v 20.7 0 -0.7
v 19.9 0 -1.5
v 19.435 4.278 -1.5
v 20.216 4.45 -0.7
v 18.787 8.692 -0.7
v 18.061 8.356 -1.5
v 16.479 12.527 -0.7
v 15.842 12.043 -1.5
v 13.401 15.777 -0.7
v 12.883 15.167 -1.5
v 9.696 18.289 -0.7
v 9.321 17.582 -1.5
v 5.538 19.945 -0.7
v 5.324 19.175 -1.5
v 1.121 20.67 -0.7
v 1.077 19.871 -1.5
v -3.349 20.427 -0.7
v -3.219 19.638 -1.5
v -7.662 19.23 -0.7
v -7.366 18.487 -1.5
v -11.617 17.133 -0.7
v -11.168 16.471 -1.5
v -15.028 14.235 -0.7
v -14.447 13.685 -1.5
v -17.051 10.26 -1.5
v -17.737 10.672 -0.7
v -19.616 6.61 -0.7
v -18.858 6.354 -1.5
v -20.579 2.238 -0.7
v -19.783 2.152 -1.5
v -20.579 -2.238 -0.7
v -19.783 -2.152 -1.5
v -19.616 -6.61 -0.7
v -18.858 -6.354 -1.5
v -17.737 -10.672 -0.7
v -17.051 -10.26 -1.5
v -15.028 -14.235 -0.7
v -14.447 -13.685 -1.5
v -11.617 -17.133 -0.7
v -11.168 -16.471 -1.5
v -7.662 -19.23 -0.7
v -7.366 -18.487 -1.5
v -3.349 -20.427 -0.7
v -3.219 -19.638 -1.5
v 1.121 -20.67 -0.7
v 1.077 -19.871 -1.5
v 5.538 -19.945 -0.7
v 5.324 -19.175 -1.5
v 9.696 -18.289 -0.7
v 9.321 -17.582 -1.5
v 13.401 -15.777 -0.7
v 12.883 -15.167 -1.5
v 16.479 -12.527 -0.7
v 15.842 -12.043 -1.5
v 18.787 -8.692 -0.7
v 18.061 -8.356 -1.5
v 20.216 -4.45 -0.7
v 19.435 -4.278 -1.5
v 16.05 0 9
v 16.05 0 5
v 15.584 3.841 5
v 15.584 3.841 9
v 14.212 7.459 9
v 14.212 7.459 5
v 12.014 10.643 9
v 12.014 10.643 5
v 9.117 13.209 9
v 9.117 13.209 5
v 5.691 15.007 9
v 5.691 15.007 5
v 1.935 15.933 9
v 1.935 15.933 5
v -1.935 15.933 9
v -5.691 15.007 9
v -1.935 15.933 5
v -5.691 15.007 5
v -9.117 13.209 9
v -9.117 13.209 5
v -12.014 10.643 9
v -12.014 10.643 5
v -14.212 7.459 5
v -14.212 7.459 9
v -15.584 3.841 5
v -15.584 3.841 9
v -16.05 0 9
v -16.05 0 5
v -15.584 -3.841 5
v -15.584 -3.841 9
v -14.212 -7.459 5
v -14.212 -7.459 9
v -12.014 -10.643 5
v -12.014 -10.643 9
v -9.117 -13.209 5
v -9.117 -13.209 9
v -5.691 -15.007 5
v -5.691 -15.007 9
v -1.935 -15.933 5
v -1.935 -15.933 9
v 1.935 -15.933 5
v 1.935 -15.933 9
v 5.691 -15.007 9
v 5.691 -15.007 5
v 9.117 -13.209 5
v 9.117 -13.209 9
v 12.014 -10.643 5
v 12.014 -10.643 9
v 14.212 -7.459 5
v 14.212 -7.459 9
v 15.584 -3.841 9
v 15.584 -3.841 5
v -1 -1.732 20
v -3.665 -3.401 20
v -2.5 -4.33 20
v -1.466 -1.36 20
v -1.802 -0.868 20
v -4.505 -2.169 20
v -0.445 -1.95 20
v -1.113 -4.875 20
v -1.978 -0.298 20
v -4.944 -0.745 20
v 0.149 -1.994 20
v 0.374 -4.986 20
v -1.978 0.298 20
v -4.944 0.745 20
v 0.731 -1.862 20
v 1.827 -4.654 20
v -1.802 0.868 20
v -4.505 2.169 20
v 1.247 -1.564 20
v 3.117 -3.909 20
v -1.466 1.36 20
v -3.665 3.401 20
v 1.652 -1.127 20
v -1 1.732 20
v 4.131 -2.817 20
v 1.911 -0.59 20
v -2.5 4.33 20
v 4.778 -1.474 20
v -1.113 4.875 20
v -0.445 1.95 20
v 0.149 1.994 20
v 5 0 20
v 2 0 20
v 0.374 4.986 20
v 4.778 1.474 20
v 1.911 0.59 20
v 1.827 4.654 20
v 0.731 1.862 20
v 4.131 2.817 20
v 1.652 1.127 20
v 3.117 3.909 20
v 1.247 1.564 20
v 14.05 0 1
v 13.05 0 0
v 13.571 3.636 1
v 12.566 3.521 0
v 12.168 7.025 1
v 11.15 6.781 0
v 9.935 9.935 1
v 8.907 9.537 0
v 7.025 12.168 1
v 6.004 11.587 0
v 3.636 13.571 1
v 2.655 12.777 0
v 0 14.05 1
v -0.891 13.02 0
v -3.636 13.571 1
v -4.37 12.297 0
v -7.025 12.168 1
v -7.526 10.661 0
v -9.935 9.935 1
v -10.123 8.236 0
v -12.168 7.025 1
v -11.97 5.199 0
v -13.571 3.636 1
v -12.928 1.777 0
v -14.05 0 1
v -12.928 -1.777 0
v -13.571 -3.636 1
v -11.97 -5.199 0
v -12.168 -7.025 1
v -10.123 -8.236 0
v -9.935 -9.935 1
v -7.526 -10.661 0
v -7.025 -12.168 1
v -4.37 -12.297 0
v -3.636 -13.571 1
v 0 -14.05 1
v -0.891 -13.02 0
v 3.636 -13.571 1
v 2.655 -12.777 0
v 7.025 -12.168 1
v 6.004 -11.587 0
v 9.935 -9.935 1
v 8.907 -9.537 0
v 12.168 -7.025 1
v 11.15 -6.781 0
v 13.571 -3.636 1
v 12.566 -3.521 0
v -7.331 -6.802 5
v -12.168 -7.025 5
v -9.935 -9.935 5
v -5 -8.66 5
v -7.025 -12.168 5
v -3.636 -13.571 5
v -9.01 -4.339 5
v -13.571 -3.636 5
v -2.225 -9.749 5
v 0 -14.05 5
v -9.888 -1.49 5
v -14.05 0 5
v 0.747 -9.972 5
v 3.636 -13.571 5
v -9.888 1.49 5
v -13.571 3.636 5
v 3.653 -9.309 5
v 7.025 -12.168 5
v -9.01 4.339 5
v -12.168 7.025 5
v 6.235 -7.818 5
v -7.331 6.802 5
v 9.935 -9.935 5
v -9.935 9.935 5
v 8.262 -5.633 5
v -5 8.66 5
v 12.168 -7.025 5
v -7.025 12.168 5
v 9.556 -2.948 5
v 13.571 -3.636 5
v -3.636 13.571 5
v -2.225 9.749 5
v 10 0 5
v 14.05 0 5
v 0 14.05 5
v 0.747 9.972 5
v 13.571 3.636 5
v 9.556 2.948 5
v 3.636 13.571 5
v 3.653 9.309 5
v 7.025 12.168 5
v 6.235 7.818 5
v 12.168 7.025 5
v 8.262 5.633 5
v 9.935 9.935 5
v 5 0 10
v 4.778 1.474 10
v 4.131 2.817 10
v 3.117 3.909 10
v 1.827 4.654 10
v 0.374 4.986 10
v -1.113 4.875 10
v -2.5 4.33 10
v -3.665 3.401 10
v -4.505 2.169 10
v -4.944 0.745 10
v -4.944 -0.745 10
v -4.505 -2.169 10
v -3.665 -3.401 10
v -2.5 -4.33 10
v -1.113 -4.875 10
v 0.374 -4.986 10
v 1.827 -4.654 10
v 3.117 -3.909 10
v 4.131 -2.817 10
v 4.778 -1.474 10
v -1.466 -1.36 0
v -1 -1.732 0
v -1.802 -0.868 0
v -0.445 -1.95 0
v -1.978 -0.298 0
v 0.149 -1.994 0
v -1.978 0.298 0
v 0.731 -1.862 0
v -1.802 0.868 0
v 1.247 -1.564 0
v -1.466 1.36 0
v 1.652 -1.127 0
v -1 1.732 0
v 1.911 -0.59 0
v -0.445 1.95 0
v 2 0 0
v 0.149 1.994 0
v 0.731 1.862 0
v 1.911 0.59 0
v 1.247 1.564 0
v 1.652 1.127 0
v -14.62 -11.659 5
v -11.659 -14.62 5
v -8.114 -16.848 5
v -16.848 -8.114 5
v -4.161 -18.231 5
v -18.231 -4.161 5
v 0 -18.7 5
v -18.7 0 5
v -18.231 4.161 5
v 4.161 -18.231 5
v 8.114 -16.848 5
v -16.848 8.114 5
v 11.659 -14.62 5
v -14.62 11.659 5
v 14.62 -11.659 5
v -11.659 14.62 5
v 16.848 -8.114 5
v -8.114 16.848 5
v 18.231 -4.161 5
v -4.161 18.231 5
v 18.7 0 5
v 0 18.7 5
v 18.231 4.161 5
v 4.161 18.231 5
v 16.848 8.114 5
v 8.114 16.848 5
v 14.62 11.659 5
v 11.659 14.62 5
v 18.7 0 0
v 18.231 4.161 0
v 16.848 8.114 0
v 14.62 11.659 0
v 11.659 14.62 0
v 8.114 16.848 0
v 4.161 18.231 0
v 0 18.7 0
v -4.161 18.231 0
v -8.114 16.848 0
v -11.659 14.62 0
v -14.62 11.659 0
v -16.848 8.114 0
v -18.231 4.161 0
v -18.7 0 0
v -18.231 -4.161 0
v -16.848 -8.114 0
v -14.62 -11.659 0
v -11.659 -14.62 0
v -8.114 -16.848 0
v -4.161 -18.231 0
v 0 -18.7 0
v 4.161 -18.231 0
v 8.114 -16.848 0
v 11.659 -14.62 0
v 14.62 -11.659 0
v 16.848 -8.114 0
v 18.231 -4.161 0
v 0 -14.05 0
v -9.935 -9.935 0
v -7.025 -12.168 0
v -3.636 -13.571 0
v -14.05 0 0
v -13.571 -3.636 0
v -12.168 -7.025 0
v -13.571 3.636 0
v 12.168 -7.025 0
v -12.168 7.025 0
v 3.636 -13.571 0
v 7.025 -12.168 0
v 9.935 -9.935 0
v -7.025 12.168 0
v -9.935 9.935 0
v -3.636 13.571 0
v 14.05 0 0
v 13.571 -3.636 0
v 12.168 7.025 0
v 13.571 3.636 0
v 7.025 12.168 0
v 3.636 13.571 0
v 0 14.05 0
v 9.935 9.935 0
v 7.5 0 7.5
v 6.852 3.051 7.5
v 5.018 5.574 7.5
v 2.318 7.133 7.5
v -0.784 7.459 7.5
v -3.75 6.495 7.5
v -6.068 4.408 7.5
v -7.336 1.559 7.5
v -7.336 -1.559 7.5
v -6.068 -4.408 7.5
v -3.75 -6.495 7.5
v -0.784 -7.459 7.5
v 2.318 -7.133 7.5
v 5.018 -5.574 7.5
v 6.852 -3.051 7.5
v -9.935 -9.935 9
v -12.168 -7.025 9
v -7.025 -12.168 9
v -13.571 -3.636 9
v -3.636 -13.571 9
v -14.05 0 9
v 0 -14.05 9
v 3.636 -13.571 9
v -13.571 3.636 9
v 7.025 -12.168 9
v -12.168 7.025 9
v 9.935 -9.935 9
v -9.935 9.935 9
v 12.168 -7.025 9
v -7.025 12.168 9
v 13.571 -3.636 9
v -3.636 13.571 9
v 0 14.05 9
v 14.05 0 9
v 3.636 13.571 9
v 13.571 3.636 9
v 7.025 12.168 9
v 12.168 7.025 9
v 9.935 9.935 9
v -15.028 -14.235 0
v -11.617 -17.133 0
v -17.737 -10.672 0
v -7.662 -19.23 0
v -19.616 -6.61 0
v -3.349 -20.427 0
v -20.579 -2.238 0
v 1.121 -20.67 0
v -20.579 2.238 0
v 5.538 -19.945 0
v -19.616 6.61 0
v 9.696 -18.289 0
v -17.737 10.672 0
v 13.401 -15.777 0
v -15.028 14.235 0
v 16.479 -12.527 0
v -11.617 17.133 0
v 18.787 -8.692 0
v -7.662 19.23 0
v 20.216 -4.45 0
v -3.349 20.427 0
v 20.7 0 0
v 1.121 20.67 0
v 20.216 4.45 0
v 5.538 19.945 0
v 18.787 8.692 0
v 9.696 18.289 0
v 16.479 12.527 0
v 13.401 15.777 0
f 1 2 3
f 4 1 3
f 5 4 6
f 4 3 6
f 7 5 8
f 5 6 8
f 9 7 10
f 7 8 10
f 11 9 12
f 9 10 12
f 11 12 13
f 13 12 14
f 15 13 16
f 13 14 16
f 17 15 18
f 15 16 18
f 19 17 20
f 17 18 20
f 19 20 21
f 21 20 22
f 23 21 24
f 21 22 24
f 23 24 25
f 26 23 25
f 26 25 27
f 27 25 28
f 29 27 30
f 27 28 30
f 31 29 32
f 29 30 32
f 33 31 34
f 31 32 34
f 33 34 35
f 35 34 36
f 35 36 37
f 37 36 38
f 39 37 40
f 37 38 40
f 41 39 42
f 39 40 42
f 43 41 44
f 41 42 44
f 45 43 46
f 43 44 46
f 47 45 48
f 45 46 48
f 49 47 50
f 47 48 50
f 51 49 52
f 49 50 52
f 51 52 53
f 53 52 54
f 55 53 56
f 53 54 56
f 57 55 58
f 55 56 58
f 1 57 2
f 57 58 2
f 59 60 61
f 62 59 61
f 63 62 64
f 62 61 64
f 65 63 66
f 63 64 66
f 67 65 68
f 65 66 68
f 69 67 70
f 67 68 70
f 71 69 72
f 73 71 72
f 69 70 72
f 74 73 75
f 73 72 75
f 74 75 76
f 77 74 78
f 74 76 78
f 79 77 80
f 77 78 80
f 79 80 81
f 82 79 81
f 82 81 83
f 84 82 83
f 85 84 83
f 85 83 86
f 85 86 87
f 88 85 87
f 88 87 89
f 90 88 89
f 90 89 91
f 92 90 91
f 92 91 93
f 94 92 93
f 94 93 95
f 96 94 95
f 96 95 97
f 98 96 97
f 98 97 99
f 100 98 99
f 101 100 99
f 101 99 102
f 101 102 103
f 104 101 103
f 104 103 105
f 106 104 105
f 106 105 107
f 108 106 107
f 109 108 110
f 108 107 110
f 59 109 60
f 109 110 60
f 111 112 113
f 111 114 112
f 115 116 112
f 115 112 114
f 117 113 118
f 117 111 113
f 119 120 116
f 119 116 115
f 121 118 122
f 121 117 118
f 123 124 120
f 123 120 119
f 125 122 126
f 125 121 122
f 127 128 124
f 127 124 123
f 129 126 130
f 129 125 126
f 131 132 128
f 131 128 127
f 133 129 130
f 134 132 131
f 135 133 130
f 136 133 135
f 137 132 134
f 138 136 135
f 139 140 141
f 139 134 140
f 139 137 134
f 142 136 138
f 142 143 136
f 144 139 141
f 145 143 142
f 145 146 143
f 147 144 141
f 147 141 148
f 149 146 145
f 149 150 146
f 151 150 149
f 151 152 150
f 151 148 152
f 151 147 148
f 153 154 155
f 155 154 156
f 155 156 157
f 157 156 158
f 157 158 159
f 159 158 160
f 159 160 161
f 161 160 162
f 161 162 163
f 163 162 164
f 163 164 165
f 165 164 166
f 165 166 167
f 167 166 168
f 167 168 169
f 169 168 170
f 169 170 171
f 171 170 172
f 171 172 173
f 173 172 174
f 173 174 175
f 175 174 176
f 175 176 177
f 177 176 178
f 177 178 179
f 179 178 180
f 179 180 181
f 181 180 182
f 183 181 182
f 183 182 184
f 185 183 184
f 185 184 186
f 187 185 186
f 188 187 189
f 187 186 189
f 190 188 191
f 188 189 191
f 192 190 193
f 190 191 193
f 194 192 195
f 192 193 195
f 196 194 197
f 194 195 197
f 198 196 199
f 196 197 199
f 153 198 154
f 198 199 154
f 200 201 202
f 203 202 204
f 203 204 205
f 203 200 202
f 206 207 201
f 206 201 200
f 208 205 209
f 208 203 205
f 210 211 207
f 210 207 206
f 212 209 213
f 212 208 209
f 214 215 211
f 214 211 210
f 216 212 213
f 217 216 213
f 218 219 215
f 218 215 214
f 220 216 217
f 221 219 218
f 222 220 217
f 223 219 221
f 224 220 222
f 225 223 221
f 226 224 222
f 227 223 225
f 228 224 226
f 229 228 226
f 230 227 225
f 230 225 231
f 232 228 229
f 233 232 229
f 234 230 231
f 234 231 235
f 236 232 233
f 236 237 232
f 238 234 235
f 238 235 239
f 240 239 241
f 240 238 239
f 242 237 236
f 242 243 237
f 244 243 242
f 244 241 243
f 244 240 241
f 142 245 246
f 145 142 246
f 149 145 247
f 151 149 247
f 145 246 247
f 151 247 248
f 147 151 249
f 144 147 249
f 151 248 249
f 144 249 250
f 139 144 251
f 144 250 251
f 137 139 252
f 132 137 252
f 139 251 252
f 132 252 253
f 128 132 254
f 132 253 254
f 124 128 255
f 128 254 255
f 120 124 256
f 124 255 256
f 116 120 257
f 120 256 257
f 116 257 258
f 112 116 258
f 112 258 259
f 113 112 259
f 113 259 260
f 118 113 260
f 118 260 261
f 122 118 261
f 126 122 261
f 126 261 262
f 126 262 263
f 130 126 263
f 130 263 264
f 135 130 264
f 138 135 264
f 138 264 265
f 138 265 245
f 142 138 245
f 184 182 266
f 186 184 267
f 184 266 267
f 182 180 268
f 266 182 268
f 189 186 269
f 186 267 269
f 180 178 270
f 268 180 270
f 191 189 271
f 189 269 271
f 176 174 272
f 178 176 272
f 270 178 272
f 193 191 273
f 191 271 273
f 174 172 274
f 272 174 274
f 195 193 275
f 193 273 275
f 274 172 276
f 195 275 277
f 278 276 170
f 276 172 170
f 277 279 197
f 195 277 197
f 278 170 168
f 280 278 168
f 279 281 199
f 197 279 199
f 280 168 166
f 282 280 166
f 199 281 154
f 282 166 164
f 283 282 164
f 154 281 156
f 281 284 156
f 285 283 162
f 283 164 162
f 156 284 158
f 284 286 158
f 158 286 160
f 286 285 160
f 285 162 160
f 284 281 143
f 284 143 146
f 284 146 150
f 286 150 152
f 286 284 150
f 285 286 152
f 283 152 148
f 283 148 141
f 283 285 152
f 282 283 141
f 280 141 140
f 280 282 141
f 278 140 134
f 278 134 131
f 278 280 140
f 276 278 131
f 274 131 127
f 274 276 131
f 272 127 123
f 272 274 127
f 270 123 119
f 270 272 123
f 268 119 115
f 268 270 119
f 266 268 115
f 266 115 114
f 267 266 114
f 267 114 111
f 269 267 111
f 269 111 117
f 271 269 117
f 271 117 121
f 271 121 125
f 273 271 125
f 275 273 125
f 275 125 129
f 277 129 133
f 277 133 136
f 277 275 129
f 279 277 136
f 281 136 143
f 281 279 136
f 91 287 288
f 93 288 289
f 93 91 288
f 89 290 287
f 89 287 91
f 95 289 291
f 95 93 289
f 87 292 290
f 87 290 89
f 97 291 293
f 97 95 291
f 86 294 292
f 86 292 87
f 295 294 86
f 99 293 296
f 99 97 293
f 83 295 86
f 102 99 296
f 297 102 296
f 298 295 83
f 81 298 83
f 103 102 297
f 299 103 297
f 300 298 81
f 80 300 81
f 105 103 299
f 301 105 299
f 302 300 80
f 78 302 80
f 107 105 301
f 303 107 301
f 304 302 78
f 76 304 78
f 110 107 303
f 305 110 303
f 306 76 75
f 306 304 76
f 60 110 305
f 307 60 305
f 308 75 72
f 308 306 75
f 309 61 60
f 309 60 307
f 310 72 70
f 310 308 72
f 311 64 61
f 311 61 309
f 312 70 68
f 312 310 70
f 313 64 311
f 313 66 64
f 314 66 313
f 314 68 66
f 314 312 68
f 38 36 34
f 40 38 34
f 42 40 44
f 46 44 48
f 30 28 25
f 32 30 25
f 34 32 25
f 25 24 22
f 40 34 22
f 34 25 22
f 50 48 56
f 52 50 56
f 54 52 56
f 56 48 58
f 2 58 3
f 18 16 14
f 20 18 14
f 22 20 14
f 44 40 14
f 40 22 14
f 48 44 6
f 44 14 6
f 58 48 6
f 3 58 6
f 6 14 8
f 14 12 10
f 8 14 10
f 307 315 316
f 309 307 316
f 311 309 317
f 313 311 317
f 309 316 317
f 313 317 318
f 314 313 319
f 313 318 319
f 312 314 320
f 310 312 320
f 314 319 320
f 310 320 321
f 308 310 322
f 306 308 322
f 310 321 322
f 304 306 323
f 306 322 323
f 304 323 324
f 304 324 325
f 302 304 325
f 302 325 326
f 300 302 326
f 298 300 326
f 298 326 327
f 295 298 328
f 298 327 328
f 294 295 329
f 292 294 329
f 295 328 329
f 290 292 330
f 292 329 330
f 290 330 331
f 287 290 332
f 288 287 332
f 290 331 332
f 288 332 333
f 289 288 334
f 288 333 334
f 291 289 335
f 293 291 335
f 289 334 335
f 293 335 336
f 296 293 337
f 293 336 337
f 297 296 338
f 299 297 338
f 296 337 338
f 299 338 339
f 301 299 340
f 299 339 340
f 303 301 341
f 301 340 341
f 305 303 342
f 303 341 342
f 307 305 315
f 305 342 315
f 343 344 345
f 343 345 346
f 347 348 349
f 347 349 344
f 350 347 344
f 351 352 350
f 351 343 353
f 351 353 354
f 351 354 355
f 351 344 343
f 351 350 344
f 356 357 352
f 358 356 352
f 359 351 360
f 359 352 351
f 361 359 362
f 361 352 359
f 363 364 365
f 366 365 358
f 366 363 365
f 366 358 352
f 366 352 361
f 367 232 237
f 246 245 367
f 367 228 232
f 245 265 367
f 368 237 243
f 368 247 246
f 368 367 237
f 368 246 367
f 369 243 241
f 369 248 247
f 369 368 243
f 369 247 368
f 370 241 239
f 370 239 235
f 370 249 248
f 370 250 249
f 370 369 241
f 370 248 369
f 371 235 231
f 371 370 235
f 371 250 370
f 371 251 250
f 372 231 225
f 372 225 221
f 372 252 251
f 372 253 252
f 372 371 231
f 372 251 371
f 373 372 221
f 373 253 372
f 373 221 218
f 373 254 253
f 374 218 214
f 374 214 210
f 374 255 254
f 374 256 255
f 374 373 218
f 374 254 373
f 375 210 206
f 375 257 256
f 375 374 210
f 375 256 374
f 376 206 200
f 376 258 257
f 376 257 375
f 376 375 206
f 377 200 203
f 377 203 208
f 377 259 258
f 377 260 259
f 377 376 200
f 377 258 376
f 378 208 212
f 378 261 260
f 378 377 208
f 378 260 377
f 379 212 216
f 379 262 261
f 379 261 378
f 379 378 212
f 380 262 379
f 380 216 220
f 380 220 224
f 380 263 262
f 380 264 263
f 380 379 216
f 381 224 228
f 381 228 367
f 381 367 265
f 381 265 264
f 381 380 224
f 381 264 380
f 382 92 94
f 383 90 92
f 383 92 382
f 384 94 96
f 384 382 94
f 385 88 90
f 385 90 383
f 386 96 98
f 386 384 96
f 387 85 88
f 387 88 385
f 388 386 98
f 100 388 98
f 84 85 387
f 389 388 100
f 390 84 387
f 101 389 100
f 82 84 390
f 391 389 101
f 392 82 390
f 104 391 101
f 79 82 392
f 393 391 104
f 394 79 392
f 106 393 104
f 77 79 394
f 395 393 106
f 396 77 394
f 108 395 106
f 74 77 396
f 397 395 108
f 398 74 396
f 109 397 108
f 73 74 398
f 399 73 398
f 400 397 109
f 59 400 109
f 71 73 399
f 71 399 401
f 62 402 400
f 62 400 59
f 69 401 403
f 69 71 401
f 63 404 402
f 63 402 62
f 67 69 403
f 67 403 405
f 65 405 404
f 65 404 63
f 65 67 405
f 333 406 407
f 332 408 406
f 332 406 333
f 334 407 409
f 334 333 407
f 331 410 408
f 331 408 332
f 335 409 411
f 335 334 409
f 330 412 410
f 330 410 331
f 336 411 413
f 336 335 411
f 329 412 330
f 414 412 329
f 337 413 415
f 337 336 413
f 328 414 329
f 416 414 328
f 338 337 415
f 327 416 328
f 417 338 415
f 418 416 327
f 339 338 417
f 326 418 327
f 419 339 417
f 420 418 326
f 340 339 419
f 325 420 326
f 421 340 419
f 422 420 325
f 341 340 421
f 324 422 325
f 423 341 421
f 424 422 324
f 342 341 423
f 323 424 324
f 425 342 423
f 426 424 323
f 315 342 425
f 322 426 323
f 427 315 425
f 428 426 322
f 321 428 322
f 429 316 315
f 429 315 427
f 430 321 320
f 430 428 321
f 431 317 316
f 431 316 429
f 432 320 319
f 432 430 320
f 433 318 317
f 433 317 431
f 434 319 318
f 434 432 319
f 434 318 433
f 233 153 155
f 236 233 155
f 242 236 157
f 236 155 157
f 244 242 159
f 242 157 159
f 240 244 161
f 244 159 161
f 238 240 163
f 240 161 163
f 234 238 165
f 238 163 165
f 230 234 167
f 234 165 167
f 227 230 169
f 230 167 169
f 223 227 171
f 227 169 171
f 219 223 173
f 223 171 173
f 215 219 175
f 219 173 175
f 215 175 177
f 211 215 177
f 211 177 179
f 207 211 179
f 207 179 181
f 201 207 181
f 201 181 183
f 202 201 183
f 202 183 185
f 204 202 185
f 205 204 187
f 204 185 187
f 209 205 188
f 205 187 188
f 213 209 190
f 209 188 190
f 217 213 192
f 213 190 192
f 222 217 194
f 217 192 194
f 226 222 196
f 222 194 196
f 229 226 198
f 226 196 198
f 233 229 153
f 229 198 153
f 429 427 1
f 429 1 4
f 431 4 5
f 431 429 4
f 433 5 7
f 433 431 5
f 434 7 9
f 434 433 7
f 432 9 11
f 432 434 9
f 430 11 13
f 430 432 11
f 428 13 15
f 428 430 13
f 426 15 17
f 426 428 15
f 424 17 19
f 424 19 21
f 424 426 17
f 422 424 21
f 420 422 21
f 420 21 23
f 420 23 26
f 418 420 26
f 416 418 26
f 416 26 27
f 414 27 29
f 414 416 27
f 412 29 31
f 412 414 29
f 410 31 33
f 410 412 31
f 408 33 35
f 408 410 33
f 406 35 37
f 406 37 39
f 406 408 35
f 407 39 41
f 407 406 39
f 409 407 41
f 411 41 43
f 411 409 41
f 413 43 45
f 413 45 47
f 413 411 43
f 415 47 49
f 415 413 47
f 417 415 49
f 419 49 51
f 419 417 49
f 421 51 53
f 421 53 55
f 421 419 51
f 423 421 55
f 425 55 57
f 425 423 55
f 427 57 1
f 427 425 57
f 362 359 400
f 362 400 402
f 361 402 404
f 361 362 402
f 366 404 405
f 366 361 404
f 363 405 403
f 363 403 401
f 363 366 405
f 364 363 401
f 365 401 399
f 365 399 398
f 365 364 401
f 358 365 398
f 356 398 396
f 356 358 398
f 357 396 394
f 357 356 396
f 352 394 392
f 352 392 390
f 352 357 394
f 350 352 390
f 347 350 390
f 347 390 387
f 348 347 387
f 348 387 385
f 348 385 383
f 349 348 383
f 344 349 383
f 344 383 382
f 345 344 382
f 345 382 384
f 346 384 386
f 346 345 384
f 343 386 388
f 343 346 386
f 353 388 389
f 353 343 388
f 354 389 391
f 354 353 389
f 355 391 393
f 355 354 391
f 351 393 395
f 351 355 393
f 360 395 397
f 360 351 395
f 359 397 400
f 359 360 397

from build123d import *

# Parameters (mm, degrees)
F0_R     = 20.7
F0_R_2   = 18.7
F0_R_3   = 16.05
F0_R_4   = 14.05
F0_R_5   = 5
F0_R_6   = 2
F1_DEPTH = 1.5
F2_DEPTH = 9
F3_DEPTH = 5
F4_SIZE  = 0.8
F5_DEPTH = 20
F6_DEPTH = 5
F7_SIZE  = 1
F8_SIZE  = 5


with BuildPart() as f1:
    # F0 (on Top) → F1 (new body)
    with BuildSketch(Plane.XY):
        Circle(F0_R)
        Circle(F0_R_2, mode=Mode.SUBTRACT)
        Circle(F0_R_2)
        Circle(F0_R_3, mode=Mode.SUBTRACT)
        Circle(F0_R_3)
        Circle(F0_R_4, mode=Mode.SUBTRACT)
        Circle(F0_R_4)
        Circle(F0_R_5, mode=Mode.SUBTRACT)
        Circle(F0_R_5)
        Circle(F0_R_6, mode=Mode.SUBTRACT)
        Circle(F0_R_6)
    extrude(amount=-F1_DEPTH)

    # F0 (on Top) → F2 (join)
    with BuildSketch(Plane.XY):
        Circle(F0_R_3)
        Circle(F0_R_4, mode=Mode.SUBTRACT)
    extrude(amount=F2_DEPTH)

    # F0 (on Top) → F3 (join)
    with BuildSketch(Plane.XY):
        Circle(F0_R_2)
        Circle(F0_R_3, mode=Mode.SUBTRACT)
    extrude(amount=F3_DEPTH)

    # F4
    f4_edges = [f1.edges().sort_by_distance(p)[0] for p in [
        (-20.7, 0, -1.5),
    ]]
    chamfer(f4_edges, length=F4_SIZE)


with BuildPart() as f5:
    # F0 (on Top) → F5 (new body)
    with BuildSketch(Plane.XY):
        Circle(F0_R_5)
        Circle(F0_R_6, mode=Mode.SUBTRACT)
    extrude(amount=F5_DEPTH)

    # F0 (on Top) → F6 (join)
    with BuildSketch(Plane.XY):
        Circle(F0_R_4)
        Circle(F0_R_5, mode=Mode.SUBTRACT)
    extrude(amount=F6_DEPTH)

    # F7
    f7_edges = [f5.edges().sort_by_distance(p)[0] for p in [
        (-14.05, 0, 0),
    ]]
    chamfer(f7_edges, length=F7_SIZE)

    # F8
    f8_edges = [f5.edges().sort_by_distance(p)[0] for p in [
        (-5, 0, 5),
    ]]
    chamfer(f8_edges, length=F8_SIZE)


solid = Compound([f1.part, f5.part])
